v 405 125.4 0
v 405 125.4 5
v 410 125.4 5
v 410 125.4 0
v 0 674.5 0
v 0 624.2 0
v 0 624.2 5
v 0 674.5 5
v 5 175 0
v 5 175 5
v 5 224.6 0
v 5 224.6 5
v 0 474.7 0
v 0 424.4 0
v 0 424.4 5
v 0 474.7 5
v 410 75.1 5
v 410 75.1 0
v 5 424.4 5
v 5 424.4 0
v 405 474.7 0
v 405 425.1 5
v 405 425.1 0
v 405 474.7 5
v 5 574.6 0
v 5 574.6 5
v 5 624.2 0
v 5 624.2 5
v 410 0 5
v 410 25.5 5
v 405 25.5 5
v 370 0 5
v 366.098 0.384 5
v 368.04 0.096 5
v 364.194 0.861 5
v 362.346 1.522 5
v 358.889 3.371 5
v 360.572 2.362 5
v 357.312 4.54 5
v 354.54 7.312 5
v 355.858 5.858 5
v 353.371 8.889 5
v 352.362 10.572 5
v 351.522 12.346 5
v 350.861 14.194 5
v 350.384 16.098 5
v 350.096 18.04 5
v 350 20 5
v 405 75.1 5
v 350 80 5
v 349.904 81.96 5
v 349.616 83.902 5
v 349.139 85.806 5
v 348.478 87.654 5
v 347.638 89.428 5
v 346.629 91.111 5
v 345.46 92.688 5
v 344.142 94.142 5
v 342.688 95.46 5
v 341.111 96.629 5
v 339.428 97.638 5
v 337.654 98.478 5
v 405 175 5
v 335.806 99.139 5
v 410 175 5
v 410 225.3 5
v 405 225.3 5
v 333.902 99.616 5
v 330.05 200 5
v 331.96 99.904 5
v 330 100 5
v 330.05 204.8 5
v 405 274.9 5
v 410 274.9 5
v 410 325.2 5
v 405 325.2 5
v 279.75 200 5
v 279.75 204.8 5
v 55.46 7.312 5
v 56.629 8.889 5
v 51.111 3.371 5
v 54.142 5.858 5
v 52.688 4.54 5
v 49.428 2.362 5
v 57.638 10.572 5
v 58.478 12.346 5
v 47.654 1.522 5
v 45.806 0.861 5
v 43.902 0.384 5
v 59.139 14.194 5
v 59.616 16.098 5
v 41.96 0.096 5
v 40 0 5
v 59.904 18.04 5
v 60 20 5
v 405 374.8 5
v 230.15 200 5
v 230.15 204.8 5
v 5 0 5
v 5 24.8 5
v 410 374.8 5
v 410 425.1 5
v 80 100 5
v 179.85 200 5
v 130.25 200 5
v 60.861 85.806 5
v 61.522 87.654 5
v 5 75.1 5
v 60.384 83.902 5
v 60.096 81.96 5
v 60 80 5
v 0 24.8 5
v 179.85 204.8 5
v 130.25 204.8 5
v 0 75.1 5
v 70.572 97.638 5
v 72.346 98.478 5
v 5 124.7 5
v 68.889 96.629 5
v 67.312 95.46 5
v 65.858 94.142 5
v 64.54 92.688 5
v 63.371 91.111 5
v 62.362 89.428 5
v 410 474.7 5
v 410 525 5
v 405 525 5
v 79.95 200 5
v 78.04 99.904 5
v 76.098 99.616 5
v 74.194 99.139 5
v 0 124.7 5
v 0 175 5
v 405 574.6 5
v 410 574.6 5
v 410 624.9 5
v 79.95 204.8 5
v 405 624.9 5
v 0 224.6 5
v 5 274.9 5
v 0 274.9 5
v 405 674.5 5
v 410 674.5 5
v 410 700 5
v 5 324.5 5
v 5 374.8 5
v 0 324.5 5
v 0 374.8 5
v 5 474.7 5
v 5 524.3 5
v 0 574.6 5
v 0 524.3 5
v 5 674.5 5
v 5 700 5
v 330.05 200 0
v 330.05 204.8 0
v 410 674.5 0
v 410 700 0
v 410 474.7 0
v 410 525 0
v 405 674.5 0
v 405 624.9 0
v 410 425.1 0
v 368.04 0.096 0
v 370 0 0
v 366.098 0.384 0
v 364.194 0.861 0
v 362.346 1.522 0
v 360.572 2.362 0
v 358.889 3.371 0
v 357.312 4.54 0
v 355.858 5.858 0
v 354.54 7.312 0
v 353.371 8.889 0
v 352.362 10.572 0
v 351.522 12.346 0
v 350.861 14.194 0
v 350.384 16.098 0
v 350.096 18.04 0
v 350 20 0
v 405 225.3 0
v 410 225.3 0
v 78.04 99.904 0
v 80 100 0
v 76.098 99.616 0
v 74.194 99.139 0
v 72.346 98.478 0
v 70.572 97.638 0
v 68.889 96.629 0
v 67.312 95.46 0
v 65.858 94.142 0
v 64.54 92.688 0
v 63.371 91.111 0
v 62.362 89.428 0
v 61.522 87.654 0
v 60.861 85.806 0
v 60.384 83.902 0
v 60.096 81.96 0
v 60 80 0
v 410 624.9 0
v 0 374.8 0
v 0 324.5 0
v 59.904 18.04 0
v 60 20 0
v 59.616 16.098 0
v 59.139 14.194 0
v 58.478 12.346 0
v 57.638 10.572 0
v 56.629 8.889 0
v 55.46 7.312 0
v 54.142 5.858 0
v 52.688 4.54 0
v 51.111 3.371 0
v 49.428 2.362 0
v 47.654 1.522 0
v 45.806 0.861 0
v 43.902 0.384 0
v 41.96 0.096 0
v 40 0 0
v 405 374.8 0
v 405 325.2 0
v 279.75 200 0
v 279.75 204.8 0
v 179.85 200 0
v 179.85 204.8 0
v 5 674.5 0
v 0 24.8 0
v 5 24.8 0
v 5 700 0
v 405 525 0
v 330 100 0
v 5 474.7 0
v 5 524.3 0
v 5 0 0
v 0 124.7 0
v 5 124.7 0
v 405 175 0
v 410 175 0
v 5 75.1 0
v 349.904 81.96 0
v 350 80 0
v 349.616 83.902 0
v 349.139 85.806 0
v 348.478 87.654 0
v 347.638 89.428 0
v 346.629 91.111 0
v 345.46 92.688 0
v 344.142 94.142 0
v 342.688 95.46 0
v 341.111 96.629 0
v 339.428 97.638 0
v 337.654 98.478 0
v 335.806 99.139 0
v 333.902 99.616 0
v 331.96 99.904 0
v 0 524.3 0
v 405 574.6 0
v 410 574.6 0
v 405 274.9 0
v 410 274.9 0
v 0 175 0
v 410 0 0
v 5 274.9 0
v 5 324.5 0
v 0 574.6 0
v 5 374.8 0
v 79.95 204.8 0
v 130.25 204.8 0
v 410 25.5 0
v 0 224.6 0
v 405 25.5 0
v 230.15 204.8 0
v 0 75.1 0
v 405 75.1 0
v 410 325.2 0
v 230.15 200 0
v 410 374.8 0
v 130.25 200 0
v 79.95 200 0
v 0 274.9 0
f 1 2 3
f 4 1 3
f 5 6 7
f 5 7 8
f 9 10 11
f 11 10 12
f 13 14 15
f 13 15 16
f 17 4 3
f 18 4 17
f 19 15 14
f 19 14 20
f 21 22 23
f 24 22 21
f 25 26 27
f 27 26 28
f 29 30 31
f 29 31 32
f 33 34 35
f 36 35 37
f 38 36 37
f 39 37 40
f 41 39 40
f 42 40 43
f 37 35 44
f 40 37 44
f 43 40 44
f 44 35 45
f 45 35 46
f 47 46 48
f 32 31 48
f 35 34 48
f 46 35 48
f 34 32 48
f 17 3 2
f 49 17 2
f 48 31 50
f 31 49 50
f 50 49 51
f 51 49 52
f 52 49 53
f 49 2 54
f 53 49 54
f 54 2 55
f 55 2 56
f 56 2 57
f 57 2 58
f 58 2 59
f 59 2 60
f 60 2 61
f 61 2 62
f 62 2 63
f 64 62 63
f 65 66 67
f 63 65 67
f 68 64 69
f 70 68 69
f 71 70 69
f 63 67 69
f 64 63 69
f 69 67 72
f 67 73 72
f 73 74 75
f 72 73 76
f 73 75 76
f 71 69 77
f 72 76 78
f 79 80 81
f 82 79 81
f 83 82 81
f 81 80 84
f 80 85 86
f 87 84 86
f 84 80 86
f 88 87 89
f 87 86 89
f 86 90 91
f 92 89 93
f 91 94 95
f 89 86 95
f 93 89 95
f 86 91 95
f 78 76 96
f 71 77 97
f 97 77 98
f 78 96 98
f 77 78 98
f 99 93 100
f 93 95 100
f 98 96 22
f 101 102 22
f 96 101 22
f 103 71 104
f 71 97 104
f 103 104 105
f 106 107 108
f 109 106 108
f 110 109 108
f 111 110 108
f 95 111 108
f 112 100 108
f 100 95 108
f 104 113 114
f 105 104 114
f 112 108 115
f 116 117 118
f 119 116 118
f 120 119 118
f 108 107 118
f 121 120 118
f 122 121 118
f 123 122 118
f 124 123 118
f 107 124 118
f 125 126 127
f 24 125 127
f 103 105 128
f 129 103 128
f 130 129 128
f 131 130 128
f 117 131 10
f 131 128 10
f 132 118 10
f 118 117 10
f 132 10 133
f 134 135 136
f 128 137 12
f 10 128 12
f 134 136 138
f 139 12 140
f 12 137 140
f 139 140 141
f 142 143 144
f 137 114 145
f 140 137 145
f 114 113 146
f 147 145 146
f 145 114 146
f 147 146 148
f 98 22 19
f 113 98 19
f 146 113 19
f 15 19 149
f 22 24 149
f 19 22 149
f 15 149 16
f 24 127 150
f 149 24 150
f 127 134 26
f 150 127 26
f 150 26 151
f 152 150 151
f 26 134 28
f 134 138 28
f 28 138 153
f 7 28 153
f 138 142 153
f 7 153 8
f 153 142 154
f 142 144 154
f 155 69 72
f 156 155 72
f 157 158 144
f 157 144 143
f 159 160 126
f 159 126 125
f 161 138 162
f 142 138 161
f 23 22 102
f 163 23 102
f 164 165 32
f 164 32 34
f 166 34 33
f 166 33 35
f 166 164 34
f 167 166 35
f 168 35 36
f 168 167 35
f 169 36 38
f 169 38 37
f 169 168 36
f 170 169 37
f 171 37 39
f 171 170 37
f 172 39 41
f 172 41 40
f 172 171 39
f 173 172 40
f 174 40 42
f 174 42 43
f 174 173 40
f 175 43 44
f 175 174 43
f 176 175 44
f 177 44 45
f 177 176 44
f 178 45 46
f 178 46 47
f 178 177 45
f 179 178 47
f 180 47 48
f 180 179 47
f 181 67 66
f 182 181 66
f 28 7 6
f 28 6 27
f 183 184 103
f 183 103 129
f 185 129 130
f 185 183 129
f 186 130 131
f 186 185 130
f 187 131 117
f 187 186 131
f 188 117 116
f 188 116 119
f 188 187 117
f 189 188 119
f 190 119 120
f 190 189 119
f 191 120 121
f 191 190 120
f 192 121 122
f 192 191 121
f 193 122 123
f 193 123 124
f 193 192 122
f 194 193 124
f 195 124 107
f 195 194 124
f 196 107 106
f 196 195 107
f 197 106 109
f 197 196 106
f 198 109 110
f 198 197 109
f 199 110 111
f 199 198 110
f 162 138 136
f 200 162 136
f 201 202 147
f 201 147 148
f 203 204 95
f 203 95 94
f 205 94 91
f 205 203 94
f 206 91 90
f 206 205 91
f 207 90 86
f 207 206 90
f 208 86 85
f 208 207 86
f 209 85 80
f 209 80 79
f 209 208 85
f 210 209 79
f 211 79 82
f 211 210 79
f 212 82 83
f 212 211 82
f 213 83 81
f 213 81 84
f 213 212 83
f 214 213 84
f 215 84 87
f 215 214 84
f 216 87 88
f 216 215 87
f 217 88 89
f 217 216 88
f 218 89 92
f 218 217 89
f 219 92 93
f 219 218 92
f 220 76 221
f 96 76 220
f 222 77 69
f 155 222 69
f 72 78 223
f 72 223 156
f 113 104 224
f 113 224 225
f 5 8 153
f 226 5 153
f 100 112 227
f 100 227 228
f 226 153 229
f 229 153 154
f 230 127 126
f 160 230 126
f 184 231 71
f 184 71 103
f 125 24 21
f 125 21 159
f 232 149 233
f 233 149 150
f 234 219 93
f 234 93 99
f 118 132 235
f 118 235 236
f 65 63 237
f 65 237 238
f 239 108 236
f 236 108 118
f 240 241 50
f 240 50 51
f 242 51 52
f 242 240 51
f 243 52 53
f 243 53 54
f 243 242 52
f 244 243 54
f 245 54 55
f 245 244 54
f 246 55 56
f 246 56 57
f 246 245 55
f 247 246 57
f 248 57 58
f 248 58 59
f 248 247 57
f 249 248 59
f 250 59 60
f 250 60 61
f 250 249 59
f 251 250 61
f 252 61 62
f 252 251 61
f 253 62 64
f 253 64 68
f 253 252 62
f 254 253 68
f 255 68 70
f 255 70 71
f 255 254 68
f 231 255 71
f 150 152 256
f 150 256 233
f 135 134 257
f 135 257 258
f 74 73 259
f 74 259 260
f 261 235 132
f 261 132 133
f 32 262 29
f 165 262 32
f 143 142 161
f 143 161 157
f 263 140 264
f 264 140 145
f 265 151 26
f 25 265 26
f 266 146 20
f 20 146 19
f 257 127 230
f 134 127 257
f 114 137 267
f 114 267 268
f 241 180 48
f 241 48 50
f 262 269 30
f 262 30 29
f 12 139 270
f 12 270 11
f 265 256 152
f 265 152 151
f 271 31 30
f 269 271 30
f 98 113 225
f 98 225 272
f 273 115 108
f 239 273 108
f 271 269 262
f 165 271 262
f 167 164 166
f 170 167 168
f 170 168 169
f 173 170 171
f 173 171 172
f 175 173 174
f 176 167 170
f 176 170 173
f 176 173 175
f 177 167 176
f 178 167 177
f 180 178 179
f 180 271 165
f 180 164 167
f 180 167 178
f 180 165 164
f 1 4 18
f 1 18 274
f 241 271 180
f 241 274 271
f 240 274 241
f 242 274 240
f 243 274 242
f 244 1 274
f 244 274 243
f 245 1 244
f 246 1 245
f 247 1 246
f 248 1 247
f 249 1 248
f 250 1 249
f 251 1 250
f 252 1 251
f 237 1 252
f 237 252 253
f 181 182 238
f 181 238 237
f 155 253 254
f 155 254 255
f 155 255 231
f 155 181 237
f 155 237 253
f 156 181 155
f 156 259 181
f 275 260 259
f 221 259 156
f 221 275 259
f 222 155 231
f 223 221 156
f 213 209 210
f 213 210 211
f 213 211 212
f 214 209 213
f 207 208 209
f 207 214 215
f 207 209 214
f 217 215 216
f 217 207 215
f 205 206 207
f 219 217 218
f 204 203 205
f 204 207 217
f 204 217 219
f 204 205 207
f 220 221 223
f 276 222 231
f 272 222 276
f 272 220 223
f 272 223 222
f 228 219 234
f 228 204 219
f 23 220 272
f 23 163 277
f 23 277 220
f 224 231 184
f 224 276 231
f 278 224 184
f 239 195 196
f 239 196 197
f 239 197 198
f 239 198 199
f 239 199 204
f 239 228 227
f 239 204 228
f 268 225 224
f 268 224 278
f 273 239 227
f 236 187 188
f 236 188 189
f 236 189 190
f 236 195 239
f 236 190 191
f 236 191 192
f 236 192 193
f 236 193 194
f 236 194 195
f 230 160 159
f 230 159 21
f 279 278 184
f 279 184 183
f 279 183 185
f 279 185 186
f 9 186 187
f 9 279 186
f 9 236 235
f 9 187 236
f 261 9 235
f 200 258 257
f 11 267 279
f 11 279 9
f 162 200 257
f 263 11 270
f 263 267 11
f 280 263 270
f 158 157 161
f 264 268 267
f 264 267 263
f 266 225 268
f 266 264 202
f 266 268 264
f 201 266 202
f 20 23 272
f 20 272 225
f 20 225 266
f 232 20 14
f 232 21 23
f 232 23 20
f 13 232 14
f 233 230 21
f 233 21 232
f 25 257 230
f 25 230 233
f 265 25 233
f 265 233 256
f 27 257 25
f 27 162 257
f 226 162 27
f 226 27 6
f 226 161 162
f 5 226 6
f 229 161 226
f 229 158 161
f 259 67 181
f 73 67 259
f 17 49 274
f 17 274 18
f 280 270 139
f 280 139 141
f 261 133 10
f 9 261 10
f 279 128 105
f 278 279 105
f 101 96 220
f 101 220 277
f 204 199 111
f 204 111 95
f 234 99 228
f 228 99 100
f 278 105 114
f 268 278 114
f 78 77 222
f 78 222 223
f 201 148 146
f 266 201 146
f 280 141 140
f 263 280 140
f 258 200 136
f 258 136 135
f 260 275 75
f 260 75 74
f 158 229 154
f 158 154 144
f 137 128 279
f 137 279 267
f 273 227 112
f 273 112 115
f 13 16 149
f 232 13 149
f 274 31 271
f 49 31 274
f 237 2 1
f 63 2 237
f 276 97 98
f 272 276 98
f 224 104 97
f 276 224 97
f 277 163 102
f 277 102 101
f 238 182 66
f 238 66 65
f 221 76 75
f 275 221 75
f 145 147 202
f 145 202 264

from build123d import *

# Parameters (mm, degrees)
AUFSATZ_LINEAR_AUSTRAGEN1_DEPTH = 5
SKIZZE2_W                       = 50.3
SKIZZE2_H                       = 4.8
SCHNITT_LINEAR_AUSTRAGEN1_DEPTH = 5
LINEARES_MUSTER1_COUNT          = 3
LINEARES_MUSTER1_PITCH          = 99.9
SKIZZE3_W                       = 92.912444059
SKIZZE3_H                       = 49.6
SCHNITT_LINEAR_AUSTRAGEN2_DEPTH = 5
LINEARES_MUSTER2_COUNT          = 8
LINEARES_MUSTER2_PITCH          = 99.9
SKIZZE4_W                       = 86.468004991
SKIZZE4_H                       = 49.6
SCHNITT_LINEAR_AUSTRAGEN4_DEPTH = 5
LINEARES_MUSTER3_COUNT          = 7
LINEARES_MUSTER3_PITCH          = 99.9


with BuildPart() as part:
    # Skizze1 → Aufsatz-Linear austragen1 (new body)
    with BuildSketch(Plane.XY):
        with BuildLine():
            Line((0, 0), (0, 700))
            Line((0, 700), (410, 700))
            Line((410, 700), (410, 0))
            Line((410, 0), (370, 0))
            ThreePointArc((370, 0), (355.857864376, 5.857864376), (350, 20))
            Line((350, 20), (350, 80))
            ThreePointArc((350, 80), (344.142135624, 94.142135624), (330, 100))
            Line((330, 100), (80, 100))
            ThreePointArc((80, 100), (65.857864376, 94.142135624), (60, 80))
            Line((60, 80), (60, 20))
            ThreePointArc((60, 20), (54.142135624, 5.857864376), (40, 0))
            Line((40, 0), (0, 0))
        make_face()
    extrude(amount=AUFSATZ_LINEAR_AUSTRAGEN1_DEPTH)

    # Skizze2 → Schnitt-Linear austragen1 (cut)
    with BuildSketch(Plane.XY.offset(5)):
        with Locations((105.1, 202.4)):
            Rectangle(SKIZZE2_W, SKIZZE2_H)
    schnitt_linear_austragen1 = extrude(amount=-SCHNITT_LINEAR_AUSTRAGEN1_DEPTH, mode=Mode.SUBTRACT)

    # Lineares Muster1: Schnitt-Linear austragen1 ×3
    with Locations(*[(i * LINEARES_MUSTER1_PITCH, 0, 0) for i in range(1, LINEARES_MUSTER1_COUNT)]):
        add(schnitt_linear_austragen1, mode=Mode.SUBTRACT)

    # Skizze3 → Schnitt-Linear austragen2 (cut)
    with BuildSketch(Plane.XY.offset(5)):
        with Locations((-41.45622203, 699.3)):
            Rectangle(SKIZZE3_W, SKIZZE3_H)
    schnitt_linear_austragen2 = extrude(amount=-SCHNITT_LINEAR_AUSTRAGEN2_DEPTH, mode=Mode.SUBTRACT)

    # Lineares Muster2: Schnitt-Linear austragen2 ×8
    with Locations(*[(0, -i * LINEARES_MUSTER2_PITCH, 0) for i in range(1, LINEARES_MUSTER2_COUNT)]):
        add(schnitt_linear_austragen2, mode=Mode.SUBTRACT)

    # Skizze4 → Schnitt-Linear austragen4 (cut)
    with BuildSketch(Plane.XY.offset(5)):
        with Locations((448.234002496, 649.7)):
            Rectangle(SKIZZE4_W, SKIZZE4_H)
    schnitt_linear_austragen4 = extrude(amount=-SCHNITT_LINEAR_AUSTRAGEN4_DEPTH, mode=Mode.SUBTRACT)

    # Lineares Muster3: Schnitt-Linear austragen4 ×7
    with Locations(*[(0, -i * LINEARES_MUSTER3_PITCH, 0) for i in range(1, LINEARES_MUSTER3_COUNT)]):
        add(schnitt_linear_austragen4, mode=Mode.SUBTRACT)


solid = part.part
